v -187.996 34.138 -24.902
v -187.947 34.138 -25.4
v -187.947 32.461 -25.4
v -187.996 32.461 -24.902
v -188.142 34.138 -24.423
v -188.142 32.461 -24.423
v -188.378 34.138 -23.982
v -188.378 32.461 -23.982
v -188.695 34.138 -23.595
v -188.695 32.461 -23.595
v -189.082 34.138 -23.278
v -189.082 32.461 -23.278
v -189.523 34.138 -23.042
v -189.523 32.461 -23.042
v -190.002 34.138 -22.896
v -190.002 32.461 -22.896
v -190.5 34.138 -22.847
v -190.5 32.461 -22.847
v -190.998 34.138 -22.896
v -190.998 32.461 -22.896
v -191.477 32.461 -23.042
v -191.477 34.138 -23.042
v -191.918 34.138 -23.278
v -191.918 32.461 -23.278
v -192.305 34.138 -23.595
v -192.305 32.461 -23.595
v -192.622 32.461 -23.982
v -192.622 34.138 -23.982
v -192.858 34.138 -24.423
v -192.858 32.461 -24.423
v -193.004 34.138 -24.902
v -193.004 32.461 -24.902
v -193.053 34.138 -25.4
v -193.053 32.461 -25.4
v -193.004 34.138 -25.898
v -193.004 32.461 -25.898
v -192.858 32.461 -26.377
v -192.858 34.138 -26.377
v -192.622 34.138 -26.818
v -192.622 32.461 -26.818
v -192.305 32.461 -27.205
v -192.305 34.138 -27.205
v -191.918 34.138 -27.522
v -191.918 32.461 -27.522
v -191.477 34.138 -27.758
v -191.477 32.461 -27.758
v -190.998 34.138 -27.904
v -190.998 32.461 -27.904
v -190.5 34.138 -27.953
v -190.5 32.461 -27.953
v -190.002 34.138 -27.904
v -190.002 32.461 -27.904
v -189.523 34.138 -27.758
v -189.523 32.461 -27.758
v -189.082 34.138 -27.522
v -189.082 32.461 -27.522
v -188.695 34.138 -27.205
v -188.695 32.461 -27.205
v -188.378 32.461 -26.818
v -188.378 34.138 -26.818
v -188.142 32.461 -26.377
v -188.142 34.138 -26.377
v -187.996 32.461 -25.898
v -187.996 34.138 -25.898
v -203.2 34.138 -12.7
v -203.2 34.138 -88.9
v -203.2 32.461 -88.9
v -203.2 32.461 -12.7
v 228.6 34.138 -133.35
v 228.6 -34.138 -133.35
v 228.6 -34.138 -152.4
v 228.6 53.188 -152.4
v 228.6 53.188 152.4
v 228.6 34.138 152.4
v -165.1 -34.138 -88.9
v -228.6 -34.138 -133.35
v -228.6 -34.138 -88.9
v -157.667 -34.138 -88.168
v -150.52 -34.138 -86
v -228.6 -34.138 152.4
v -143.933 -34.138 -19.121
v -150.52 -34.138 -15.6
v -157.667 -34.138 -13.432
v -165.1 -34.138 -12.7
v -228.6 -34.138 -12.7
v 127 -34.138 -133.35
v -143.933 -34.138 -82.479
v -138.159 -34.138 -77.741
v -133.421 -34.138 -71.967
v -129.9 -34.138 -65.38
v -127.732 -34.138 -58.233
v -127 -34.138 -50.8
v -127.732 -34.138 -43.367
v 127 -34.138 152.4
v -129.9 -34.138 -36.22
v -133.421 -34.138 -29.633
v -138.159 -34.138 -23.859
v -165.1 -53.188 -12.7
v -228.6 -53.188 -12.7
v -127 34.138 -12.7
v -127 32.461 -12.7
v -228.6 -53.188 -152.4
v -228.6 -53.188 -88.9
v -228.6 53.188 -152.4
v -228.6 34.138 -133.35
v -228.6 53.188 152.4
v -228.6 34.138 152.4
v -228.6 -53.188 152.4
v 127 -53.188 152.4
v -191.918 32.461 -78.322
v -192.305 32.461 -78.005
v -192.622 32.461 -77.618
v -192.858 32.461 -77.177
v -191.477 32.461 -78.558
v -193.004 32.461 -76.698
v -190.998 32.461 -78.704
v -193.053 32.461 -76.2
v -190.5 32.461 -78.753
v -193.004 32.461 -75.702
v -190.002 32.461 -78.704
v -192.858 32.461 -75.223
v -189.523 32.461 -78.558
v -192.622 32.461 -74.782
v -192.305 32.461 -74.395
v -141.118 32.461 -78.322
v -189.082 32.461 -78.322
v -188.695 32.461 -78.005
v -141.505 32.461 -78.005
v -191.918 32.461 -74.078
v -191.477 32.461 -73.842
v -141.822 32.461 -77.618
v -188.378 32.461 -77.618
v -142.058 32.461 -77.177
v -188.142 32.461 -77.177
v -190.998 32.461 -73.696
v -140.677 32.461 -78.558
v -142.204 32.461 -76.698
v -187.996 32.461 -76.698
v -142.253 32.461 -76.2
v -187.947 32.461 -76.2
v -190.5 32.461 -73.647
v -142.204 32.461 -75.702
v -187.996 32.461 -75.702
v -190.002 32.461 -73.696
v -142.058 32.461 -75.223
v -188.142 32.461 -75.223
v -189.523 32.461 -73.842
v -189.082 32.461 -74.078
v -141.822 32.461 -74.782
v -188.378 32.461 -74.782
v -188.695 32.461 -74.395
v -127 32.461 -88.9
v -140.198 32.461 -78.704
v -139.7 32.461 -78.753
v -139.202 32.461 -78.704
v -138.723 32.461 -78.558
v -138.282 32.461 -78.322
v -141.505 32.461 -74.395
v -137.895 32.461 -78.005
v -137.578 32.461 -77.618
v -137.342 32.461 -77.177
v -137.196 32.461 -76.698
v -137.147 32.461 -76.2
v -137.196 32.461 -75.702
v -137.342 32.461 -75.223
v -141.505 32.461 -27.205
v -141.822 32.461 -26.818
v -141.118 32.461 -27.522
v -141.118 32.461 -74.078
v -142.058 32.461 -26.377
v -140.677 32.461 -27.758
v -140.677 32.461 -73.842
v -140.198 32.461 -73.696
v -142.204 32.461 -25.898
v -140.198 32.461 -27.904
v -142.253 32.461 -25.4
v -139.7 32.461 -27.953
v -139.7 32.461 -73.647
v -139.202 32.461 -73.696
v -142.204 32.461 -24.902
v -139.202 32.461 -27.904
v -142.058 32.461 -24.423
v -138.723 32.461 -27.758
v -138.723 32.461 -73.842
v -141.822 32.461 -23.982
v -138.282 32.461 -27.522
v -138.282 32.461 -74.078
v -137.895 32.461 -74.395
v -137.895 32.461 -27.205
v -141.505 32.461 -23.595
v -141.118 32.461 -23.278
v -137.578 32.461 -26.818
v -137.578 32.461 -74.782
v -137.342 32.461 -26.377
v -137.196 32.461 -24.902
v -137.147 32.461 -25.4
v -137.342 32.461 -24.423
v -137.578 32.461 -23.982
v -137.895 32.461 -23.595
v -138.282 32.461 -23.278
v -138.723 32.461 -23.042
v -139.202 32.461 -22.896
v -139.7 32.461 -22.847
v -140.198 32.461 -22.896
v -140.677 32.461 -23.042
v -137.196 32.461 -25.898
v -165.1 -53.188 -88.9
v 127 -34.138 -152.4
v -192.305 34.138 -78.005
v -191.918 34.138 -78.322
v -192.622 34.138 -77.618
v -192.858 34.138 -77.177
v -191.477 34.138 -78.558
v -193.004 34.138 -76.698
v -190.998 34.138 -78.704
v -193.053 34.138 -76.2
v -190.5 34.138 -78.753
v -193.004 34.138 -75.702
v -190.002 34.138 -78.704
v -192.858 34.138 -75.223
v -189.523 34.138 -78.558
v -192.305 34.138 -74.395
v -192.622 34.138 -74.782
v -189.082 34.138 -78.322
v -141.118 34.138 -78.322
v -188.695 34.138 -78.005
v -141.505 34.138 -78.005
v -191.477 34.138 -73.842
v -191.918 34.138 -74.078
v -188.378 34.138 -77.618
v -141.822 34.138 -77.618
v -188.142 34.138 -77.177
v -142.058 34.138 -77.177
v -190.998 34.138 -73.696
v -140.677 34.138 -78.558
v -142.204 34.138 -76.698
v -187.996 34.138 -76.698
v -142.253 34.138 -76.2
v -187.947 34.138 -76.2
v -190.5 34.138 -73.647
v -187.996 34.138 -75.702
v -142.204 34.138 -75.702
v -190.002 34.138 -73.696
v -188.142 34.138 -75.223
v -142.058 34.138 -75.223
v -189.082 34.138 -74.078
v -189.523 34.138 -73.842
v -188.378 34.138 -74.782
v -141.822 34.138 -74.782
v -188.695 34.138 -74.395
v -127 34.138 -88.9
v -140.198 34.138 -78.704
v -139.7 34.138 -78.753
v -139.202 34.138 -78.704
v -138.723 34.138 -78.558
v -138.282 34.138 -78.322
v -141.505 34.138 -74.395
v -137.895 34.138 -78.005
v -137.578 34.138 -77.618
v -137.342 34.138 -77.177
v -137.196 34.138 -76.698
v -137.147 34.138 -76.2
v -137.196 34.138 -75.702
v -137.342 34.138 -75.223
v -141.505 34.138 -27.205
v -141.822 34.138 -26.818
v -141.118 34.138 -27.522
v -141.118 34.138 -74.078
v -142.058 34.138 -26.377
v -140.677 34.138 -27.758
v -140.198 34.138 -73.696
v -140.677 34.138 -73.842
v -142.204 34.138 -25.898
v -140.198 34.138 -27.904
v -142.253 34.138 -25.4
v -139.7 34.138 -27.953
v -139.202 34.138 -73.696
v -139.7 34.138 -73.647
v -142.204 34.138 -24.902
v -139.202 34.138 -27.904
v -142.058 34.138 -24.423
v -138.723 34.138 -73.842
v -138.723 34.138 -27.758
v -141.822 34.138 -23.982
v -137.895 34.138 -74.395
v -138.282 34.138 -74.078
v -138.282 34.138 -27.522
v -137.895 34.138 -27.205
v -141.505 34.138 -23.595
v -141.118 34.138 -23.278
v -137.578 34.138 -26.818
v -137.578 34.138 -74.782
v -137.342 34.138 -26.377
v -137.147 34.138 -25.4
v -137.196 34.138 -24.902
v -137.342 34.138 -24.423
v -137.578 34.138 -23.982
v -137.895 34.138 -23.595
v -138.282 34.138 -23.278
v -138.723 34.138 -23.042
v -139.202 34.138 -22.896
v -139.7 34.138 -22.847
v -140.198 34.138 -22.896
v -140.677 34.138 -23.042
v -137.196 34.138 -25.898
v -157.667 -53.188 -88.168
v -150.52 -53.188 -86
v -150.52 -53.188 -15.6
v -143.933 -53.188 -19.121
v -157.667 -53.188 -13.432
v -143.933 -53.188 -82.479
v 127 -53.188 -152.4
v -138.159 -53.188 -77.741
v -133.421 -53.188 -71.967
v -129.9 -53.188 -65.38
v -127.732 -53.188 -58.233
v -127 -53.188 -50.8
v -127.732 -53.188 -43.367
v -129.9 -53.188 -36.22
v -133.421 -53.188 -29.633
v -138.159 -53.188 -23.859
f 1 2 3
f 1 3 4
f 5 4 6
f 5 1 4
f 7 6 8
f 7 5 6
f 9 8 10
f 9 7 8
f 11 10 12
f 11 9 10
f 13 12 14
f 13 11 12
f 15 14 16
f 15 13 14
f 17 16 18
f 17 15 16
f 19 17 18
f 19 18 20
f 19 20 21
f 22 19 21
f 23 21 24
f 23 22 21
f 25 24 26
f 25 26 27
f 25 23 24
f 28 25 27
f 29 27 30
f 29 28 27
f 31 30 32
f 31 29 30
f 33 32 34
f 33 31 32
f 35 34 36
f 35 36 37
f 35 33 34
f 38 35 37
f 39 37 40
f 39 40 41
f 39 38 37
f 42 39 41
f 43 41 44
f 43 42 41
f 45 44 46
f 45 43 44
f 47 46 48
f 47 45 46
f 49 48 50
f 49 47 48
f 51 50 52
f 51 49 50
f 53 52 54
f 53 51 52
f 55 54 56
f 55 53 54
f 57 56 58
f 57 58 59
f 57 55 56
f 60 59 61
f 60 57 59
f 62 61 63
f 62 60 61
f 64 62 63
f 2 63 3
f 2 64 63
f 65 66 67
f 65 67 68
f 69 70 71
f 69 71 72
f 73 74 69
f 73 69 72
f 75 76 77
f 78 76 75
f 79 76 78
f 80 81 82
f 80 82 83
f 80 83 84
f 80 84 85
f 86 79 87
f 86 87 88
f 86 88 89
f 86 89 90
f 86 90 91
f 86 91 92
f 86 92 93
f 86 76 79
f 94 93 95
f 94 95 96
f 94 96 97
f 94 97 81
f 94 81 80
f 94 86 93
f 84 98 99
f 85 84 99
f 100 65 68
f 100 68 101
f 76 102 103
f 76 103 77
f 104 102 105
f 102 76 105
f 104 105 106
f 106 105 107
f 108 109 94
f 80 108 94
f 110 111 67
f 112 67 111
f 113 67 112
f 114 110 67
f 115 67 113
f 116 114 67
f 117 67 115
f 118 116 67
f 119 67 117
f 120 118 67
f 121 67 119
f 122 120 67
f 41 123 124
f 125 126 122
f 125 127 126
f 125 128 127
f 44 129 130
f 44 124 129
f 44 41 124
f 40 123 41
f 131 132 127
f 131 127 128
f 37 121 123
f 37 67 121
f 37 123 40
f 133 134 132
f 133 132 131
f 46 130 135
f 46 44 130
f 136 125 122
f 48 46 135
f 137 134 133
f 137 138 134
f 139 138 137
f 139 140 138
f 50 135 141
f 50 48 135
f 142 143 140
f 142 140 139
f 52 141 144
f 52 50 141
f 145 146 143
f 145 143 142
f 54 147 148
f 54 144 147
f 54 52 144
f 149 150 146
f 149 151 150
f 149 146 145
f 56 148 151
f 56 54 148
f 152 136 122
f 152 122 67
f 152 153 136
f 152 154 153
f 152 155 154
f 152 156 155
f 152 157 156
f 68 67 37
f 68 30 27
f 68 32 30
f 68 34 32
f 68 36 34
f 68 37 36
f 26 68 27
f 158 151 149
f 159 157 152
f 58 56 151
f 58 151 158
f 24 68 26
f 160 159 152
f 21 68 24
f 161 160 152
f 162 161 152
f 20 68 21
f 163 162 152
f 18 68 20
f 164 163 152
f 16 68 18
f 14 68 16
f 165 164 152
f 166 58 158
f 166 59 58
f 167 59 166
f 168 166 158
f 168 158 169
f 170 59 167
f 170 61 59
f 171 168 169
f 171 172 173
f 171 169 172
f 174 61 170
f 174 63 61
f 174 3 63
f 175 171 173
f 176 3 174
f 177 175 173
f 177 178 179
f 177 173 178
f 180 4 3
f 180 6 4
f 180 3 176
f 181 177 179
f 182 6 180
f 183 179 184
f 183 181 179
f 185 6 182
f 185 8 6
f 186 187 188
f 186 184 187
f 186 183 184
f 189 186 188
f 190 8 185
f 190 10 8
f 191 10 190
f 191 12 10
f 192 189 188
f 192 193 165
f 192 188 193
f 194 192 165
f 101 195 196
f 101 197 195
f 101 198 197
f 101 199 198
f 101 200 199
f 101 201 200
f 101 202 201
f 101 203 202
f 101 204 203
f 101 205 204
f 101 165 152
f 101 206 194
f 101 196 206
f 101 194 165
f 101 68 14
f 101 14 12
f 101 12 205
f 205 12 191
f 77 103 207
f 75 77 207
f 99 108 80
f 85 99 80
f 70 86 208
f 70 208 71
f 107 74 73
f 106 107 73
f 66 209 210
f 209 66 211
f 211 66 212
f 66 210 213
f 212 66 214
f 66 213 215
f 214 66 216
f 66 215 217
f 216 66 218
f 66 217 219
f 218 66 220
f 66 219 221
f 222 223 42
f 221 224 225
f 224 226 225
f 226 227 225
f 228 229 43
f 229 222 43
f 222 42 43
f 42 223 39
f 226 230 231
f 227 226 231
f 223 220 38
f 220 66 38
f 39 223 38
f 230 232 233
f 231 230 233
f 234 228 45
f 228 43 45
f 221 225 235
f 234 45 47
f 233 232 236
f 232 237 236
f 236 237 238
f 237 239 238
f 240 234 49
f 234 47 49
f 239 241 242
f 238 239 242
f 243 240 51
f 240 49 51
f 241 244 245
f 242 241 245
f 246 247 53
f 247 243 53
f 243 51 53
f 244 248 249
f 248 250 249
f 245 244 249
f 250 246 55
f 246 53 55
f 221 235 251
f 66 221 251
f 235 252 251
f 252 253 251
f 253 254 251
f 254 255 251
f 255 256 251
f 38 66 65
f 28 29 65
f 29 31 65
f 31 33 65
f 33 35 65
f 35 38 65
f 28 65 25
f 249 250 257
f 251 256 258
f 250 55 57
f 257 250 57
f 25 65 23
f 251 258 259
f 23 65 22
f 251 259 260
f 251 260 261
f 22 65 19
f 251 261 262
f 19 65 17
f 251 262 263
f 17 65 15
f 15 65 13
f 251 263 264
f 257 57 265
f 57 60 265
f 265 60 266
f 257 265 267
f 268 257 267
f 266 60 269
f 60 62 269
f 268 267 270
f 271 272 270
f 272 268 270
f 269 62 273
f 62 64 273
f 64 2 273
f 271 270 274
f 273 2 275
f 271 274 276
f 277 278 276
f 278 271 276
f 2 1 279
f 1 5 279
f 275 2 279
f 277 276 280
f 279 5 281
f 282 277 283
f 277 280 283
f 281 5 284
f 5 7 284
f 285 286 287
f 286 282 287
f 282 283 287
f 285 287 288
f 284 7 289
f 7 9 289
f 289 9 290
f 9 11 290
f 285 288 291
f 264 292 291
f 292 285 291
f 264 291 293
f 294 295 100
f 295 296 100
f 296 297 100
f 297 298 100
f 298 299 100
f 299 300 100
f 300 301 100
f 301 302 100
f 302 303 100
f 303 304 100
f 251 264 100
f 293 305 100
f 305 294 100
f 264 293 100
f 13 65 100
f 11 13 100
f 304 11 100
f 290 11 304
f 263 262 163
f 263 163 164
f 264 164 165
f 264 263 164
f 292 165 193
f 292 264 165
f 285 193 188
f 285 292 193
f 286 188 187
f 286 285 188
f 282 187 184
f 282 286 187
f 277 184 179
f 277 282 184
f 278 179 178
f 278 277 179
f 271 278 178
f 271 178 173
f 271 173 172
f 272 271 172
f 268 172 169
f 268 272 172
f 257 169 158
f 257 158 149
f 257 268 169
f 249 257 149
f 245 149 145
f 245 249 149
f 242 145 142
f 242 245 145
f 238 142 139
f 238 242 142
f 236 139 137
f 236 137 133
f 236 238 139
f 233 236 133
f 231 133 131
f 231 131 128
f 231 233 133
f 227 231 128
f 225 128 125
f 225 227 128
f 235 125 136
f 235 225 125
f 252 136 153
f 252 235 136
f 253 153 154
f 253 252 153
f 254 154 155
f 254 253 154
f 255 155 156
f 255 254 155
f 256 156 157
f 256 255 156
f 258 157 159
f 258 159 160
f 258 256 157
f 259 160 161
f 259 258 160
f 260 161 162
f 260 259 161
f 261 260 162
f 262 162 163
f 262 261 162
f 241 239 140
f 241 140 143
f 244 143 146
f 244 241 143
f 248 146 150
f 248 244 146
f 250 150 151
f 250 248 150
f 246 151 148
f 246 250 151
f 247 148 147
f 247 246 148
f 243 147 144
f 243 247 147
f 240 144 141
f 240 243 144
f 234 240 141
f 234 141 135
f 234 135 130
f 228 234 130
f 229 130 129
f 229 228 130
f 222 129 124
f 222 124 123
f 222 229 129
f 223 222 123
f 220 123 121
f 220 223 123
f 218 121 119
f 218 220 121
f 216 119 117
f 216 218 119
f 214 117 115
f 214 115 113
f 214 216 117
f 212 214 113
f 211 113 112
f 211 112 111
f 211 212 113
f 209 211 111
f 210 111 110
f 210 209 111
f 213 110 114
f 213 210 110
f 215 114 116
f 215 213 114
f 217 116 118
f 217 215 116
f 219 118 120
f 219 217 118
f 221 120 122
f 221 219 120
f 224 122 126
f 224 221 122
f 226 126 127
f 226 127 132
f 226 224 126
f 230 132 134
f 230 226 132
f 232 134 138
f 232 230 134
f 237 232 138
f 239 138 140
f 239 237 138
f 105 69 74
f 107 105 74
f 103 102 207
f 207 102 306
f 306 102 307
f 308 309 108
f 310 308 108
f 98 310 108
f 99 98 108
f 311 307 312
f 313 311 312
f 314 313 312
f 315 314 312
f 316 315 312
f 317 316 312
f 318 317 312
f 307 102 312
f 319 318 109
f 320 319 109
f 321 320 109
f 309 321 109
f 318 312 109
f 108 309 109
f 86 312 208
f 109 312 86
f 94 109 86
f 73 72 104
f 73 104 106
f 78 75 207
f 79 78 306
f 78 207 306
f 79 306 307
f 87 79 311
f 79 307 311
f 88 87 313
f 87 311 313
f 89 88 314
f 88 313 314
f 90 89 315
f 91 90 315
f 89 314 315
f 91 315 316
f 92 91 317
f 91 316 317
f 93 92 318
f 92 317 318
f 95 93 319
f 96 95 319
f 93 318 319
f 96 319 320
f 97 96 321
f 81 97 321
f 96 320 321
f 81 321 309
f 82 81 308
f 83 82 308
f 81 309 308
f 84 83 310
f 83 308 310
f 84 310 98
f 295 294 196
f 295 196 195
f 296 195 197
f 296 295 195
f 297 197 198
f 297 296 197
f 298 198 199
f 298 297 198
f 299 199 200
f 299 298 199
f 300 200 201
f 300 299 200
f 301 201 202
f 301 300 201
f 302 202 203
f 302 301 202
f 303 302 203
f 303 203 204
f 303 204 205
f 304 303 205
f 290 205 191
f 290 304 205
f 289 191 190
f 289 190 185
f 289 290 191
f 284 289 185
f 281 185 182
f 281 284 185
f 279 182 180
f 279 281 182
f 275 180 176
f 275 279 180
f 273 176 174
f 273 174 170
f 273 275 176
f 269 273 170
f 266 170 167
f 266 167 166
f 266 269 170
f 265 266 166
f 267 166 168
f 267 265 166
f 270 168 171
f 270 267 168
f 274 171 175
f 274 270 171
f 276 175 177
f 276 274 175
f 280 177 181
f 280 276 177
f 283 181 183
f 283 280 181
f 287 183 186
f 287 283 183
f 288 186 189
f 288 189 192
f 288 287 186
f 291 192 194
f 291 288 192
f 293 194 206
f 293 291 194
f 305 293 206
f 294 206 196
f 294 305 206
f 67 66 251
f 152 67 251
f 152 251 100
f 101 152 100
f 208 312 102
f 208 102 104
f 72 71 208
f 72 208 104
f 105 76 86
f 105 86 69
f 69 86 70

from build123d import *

# Parameters (mm, degrees)
F0_W      = 106.3752
F0_H      = 304.8
F1_DEPTH  = 228.6
F3_W      = 68.2752
F3_H      = 285.75
F4_DEPTH  = 228.6
F5_W      = 101.6
F5_H      = 285.75
F6_DEPTH  = 19.05
F7_W      = 76.2
F7_H      = 76.2
F7_R      = 2.5527
F8_DEPTH  = 1.6764
F10_DEPTH = 19.05
F11_W     = 101.6
F11_H     = 19.05
F12_DEPTH = 19.051


with BuildPart() as f1:
    # F0 (on Right) → F1 (new body, symmetric)
    with BuildSketch(Plane.YZ):
        Rectangle(F0_W, F0_H)
    extrude(amount=F1_DEPTH, both=True)

    # F3 (on Right) → F4 (cut, symmetric)
    with BuildSketch(Plane.YZ):
        with Locations((0, 9.525)):
            Rectangle(F3_W, F3_H)
    extrude(amount=F4_DEPTH, both=True, mode=Mode.SUBTRACT)

    # F5 (on face) → F6 (cut, through all)
    with BuildSketch(Plane.XZ.offset(53.1876)):
        with Locations((177.8, 9.525)):
            Rectangle(F5_W, F5_H)
    extrude(amount=-F6_DEPTH, mode=Mode.SUBTRACT)

    # F9 (on face) → F10 (cut, through all)
    with BuildSketch(Plane.XZ.offset(53.1876)):
        with BuildLine():
            Line((-228.6, -88.9), (-165.1, -88.9))
            ThreePointArc((-165.1, -88.9), (-127, -50.8), (-165.1, -12.7))
            Line((-165.1, -12.7), (-228.6, -12.7))
            Line((-228.6, -12.7), (-228.6, -88.9))
        make_face()
    extrude(amount=-F10_DEPTH, mode=Mode.SUBTRACT)

    # F11 (on face) → F12 (cut, through all)
    with BuildSketch(Plane.XY.offset(-133.35)):
        with Locations((177.8, -43.6626)):
            Rectangle(F11_W, F11_H)
    extrude(amount=-F12_DEPTH, mode=Mode.SUBTRACT)


with BuildPart() as f8:
    # F7 (on face) → F8 (new body)
    with BuildSketch(Plane.XZ.offset(-34.1376)):
        with Locations((-165.1, -50.8)):
            Rectangle(F7_W, F7_H)
        with Locations((-190.5, -76.2)):
            Circle(F7_R, mode=Mode.SUBTRACT)
        with Locations((-139.7, -76.2)):
            Circle(F7_R, mode=Mode.SUBTRACT)
        with Locations((-190.5, -25.4)):
            Circle(F7_R, mode=Mode.SUBTRACT)
        with Locations((-139.7, -25.4)):
            Circle(F7_R, mode=Mode.SUBTRACT)
    extrude(amount=F8_DEPTH)


solid = Compound([f1.part, f8.part])
